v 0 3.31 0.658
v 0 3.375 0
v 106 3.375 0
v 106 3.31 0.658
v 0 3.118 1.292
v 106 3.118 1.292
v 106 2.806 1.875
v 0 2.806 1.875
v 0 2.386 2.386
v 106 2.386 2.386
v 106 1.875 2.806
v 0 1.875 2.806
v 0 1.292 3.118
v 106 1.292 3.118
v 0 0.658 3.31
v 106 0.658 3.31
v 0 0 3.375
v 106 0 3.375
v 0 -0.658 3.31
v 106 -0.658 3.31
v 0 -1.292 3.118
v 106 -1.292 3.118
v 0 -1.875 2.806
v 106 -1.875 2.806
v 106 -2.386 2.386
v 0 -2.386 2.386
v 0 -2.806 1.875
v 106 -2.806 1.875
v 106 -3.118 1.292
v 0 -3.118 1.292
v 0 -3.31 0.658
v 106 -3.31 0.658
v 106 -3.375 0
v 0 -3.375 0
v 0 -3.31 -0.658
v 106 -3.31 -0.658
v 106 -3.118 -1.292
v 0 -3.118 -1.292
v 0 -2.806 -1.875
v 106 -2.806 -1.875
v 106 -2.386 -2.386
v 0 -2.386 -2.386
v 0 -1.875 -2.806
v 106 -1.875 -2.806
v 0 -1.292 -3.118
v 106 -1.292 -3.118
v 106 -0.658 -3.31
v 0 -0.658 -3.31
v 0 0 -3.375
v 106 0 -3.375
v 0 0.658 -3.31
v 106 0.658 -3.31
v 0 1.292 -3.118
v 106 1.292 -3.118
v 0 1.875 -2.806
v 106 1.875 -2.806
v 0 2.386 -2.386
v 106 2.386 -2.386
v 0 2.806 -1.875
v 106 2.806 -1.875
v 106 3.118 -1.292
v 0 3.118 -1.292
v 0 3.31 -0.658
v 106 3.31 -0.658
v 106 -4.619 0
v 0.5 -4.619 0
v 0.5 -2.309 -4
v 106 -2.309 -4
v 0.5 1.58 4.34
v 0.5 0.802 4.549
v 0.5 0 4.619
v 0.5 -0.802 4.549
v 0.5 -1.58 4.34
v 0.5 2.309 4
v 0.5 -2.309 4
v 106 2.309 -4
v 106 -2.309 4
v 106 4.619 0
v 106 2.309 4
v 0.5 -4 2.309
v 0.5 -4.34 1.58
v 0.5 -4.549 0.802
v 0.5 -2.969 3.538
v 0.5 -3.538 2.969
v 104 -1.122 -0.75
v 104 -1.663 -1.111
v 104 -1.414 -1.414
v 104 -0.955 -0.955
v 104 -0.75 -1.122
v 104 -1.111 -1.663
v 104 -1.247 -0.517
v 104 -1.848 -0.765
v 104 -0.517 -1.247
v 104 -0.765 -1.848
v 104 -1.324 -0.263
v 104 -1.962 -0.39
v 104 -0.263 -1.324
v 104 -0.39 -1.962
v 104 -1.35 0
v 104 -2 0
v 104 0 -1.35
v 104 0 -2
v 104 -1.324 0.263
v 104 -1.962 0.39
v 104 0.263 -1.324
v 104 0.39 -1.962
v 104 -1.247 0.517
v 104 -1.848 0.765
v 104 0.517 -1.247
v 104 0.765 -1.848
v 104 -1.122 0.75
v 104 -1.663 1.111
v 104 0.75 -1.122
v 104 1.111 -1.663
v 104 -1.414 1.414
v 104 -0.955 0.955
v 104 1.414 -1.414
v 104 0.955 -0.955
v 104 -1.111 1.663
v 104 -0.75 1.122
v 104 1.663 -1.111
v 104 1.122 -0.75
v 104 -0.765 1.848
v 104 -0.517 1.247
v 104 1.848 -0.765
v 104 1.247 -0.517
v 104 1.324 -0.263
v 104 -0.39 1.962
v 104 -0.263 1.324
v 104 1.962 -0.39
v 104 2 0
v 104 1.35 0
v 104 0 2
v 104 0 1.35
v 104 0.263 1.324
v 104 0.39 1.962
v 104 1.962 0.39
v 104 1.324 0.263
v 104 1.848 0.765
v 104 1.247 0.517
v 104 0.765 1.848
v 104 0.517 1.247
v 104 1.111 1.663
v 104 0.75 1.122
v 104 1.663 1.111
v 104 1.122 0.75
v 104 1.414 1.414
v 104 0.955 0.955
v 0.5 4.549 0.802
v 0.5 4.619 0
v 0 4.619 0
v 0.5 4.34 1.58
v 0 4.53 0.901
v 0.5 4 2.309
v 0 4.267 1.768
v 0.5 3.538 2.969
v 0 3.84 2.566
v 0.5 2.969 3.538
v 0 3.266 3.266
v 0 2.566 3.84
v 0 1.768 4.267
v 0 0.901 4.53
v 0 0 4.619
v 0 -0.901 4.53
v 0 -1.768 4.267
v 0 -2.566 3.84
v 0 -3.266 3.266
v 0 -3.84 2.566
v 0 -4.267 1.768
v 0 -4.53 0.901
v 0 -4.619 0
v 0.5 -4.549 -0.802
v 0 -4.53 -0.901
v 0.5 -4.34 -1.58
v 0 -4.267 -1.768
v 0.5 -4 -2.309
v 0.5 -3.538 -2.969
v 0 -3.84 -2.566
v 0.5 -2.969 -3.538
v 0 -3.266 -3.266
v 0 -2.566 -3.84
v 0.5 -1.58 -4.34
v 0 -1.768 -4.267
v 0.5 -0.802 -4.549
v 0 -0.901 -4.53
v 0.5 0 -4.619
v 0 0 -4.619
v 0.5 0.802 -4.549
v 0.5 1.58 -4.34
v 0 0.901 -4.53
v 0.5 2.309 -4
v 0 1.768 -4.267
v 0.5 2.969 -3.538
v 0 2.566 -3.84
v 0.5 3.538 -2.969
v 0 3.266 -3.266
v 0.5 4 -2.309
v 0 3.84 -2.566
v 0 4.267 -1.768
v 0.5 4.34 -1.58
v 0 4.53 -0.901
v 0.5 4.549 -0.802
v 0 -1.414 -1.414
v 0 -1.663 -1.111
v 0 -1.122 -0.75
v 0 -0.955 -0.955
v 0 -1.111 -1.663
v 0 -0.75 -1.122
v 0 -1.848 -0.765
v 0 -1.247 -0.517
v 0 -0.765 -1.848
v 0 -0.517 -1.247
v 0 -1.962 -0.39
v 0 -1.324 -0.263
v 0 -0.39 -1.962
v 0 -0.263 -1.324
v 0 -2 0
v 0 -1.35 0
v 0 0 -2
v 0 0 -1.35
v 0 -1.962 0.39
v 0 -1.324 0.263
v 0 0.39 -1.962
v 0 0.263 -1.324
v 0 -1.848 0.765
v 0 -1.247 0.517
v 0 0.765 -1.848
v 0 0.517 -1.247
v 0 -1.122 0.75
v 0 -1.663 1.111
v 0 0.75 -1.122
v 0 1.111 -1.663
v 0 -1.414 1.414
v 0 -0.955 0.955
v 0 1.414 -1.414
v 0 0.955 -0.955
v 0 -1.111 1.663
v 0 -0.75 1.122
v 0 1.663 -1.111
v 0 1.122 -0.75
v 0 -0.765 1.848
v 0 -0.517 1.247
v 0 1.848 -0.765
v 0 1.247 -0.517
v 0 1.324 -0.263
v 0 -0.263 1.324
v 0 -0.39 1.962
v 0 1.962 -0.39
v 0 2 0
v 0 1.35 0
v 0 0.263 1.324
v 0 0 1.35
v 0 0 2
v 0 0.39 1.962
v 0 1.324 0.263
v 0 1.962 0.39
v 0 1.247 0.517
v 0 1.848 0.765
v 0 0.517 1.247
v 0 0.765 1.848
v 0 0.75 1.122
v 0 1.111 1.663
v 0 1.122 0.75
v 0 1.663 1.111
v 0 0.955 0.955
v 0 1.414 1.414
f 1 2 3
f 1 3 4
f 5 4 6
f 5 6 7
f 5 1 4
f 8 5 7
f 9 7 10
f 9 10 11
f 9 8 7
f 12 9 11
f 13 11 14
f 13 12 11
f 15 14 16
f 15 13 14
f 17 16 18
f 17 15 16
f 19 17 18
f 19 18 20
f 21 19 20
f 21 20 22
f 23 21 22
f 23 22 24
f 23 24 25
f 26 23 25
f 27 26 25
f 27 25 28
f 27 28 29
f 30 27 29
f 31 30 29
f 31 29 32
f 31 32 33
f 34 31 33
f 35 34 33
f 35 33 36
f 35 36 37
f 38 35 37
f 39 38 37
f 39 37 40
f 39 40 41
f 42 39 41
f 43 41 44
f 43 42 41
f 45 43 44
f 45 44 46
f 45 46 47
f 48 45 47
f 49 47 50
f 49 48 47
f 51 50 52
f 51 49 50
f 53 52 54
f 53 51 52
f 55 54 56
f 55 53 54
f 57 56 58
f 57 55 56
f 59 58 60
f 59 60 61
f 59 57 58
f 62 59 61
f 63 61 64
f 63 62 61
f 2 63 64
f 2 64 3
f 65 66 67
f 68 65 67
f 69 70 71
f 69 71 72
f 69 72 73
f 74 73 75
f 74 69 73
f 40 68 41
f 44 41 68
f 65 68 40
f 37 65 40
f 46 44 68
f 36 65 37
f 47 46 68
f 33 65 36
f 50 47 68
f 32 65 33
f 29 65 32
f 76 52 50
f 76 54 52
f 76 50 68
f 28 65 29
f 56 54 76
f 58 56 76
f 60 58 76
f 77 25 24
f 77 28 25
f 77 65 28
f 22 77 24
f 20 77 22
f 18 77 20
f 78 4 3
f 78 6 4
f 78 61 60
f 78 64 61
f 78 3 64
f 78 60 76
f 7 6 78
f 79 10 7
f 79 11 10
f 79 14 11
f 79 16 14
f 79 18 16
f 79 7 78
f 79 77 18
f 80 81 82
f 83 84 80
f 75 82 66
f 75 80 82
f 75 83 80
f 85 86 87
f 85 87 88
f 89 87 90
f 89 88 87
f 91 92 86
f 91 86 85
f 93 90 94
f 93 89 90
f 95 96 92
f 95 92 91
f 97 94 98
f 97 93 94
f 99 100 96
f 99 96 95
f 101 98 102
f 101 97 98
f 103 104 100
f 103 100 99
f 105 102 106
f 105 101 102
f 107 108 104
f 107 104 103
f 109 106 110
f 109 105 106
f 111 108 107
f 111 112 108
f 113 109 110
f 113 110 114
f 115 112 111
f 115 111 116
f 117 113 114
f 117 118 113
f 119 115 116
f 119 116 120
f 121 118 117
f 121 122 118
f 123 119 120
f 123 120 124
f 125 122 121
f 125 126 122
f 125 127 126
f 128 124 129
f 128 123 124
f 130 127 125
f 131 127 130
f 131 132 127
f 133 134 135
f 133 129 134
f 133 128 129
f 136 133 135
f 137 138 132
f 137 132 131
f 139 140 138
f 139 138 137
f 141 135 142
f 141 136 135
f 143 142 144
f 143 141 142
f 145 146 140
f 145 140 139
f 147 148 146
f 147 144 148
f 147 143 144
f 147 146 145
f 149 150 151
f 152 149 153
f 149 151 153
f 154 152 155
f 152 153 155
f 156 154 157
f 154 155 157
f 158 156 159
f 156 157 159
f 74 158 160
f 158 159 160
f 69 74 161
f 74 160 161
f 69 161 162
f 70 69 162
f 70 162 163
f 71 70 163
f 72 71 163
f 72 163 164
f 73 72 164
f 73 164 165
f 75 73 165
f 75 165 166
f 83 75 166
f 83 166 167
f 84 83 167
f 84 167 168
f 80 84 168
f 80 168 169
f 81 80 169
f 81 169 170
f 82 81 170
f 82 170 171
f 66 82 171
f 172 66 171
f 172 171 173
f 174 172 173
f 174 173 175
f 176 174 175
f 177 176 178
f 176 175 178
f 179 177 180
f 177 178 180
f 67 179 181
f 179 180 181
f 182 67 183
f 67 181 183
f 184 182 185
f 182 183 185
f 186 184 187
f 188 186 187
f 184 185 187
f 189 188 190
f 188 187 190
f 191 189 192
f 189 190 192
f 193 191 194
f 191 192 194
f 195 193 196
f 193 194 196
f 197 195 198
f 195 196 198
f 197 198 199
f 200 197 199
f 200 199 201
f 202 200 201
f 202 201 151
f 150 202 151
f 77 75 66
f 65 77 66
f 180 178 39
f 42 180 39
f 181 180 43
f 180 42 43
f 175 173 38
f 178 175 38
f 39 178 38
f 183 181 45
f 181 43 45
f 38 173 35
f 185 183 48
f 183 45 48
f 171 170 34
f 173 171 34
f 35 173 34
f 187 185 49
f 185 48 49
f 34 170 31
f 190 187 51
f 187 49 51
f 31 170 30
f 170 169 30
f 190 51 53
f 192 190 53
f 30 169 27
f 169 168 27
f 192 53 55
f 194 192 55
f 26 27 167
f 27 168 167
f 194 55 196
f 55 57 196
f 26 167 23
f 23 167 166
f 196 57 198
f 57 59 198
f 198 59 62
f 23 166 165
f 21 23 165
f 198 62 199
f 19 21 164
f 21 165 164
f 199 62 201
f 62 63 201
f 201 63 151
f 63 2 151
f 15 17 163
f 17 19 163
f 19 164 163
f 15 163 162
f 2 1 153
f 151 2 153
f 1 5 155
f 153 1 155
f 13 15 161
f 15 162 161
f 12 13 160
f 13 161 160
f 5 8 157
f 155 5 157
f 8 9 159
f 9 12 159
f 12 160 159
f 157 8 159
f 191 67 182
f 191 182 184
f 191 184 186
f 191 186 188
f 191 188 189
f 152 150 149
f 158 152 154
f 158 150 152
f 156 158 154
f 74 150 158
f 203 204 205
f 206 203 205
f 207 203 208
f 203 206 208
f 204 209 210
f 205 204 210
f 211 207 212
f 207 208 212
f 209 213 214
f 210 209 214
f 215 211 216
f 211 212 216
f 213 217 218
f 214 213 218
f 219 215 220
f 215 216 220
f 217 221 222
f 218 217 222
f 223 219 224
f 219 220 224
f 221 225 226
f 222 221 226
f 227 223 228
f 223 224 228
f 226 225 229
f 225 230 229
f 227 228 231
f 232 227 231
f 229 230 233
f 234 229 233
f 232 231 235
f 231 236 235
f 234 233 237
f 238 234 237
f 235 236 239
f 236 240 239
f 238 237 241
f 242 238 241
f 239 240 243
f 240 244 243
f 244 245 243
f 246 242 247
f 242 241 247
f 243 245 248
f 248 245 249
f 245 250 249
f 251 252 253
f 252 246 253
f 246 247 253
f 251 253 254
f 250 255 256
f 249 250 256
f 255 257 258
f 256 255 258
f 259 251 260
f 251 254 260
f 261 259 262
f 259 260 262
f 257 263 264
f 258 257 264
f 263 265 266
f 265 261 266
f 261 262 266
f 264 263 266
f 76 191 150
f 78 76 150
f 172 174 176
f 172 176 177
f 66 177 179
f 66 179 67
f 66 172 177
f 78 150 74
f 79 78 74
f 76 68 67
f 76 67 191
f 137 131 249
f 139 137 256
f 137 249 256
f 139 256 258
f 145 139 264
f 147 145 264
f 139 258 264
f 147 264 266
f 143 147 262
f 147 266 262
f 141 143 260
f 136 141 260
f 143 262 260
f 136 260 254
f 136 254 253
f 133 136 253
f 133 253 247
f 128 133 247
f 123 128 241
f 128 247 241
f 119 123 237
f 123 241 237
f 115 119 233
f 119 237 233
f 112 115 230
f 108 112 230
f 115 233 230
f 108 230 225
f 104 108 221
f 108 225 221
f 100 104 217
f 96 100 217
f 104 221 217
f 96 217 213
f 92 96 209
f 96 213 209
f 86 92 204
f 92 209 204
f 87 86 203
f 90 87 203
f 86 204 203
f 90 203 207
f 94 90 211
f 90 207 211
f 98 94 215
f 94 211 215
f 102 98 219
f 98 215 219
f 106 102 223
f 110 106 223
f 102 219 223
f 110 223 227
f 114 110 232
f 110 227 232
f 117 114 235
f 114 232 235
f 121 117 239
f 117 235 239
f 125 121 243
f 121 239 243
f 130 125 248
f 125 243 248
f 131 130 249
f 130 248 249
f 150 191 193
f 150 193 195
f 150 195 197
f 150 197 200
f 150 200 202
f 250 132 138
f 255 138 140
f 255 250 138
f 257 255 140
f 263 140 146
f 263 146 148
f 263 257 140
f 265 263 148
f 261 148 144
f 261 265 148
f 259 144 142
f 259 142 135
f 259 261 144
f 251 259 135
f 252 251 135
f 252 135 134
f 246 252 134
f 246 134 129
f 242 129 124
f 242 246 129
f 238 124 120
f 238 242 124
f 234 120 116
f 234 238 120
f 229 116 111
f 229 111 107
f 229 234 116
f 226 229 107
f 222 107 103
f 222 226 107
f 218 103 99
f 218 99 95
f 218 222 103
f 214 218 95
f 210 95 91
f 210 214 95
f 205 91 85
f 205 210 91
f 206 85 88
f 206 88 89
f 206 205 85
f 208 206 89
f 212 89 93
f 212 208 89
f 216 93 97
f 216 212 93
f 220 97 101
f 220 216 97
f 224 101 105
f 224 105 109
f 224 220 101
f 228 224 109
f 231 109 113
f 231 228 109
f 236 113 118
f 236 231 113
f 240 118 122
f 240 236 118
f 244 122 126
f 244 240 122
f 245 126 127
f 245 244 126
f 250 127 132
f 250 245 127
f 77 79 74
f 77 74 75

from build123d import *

# Parameters (mm, degrees)
F0_R     = 2
F0_R_2   = 1.35
F1_DEPTH = 104
F2_R     = 3.375
F3_DEPTH = 106
F4_R     = 4.618802
F4_R_2   = 3.375
F5_DEPTH = 0.5


with BuildPart() as f1:
    # F0 (on Right) → F1 (new body)
    with BuildSketch(Plane.YZ):
        Circle(F0_R)
        Circle(F0_R_2, mode=Mode.SUBTRACT)
    extrude(amount=F1_DEPTH)


with BuildPart() as f3:
    # F2 (on Right) → F3 (new body)
    with BuildSketch(Plane.YZ):
        Polygon((-2.309401, 4), (-4.618802, 0), (-2.309401, -4), (2.309401, -4), (4.618802, 0), (2.309401, 4), align=None)
        Circle(F2_R, mode=Mode.SUBTRACT)
    extrude(amount=F3_DEPTH)

    # F4 (on Right) → F5 (join)
    with BuildSketch(Plane.YZ):
        Circle(F4_R)
        Circle(F4_R_2, mode=Mode.SUBTRACT)
    extrude(amount=F5_DEPTH)


solid = Compound([f1.part, f3.part])
